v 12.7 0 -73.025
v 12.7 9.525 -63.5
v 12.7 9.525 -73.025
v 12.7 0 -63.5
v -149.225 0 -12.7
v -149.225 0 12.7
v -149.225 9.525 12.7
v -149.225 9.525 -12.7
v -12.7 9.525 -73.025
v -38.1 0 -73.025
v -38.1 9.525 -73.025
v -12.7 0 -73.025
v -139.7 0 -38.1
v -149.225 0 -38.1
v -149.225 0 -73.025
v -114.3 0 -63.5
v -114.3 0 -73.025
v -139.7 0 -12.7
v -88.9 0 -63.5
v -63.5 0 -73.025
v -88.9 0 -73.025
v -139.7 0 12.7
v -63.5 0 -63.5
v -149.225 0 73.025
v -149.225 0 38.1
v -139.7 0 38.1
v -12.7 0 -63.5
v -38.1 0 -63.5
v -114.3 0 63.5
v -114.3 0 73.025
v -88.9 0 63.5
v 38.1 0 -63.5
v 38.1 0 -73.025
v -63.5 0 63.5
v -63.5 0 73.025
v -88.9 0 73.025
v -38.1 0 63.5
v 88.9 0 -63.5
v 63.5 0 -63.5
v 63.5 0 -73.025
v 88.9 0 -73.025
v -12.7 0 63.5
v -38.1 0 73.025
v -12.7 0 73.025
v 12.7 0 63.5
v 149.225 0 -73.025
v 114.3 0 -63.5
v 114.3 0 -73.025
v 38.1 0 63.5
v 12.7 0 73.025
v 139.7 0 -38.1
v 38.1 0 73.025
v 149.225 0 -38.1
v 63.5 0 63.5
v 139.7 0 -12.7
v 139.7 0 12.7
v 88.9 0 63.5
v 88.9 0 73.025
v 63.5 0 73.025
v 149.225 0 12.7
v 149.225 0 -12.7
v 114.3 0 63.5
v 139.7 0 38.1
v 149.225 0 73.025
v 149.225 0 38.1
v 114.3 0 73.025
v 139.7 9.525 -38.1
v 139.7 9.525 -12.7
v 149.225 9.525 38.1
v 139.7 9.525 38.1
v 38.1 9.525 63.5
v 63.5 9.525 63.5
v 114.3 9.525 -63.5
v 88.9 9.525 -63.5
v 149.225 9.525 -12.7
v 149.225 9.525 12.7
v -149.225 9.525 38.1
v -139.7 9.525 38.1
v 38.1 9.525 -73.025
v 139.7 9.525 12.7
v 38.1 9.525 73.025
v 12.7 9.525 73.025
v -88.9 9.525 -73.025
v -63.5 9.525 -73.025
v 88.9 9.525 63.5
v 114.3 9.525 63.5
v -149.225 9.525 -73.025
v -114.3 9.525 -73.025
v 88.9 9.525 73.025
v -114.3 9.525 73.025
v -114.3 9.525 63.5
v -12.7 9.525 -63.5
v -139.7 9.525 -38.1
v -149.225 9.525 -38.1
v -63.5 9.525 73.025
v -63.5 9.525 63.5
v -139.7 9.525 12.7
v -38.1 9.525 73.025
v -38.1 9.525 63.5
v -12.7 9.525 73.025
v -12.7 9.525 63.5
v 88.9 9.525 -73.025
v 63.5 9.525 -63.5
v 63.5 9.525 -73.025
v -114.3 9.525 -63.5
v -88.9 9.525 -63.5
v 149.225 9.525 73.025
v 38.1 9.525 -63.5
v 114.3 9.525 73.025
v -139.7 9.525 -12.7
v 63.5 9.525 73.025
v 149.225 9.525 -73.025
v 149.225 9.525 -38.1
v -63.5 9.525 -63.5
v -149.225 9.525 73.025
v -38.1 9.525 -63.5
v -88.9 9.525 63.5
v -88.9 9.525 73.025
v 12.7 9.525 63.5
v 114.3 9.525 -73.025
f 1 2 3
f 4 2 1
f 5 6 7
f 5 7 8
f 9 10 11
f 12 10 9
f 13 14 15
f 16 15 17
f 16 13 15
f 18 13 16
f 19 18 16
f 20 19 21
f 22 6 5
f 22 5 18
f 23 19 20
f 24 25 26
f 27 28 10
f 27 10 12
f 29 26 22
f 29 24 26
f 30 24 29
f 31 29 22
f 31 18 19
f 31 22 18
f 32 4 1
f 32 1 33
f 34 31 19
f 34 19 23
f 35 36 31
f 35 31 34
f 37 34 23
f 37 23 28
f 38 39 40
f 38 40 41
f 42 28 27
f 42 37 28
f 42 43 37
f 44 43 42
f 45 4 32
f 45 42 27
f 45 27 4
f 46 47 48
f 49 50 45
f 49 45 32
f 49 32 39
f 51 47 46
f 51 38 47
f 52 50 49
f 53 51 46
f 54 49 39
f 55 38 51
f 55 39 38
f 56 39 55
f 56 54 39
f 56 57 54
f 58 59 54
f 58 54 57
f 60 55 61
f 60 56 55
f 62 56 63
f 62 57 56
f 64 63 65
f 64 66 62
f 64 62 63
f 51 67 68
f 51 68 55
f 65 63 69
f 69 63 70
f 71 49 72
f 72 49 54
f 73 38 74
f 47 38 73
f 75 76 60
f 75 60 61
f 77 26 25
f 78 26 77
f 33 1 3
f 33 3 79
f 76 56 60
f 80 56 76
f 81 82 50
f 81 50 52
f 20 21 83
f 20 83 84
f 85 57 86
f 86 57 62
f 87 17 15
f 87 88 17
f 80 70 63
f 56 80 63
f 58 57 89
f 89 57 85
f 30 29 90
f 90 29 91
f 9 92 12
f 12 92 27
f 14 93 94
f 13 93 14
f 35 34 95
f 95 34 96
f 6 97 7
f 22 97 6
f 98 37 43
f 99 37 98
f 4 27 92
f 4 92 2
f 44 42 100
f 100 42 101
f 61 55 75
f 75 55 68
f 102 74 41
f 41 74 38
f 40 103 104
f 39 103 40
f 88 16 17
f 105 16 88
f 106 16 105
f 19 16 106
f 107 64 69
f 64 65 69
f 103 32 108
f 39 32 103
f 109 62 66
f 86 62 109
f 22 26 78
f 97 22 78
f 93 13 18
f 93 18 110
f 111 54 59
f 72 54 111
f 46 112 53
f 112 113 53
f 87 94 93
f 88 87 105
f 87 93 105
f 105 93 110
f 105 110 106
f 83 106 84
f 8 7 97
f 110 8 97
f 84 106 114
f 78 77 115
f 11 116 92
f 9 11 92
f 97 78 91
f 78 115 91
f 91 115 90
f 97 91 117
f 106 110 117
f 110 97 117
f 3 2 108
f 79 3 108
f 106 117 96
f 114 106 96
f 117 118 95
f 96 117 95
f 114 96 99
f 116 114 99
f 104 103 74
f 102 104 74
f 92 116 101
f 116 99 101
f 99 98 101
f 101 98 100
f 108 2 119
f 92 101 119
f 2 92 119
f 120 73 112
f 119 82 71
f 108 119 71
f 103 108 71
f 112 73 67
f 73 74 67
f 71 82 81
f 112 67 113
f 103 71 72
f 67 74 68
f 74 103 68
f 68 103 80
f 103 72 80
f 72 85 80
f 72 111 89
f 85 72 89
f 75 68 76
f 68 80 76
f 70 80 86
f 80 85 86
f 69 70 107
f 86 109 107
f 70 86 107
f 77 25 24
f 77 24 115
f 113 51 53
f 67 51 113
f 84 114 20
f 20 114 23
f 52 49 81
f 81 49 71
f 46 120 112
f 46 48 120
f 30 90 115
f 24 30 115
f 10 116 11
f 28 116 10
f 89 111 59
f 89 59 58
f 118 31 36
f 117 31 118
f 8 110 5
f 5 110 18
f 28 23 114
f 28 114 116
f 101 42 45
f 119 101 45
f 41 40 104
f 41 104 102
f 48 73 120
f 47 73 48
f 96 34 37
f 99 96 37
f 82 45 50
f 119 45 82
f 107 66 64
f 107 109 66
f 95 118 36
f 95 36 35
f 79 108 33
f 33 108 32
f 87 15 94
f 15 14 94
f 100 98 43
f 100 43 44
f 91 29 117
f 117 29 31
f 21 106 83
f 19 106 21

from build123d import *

# Parameters (mm, degrees)
SKETCH2_W               = 279.4
SKETCH2_H               = 127
BOSS_EXTRUDE1_DEPTH     = 9.525
SKETCH3_W               = 25.4
SKETCH3_H               = 9.525
BOSS_EXTRUDE2_DEPTH     = 9.525
LPATTERN1_COUNT         = 6
LPATTERN1_PITCH         = 50.8
MIRROR1_COPY_1_SKETCH_W = 25.4
MIRROR1_COPY_1_SKETCH_H = 9.525
MIRROR1_COPY_1_DEPTH    = 9.525
MIRROR1_COPY_2_SKETCH_W = 25.4
MIRROR1_COPY_2_SKETCH_H = 9.525
MIRROR1_COPY_2_DEPTH    = 9.525
MIRROR1_COPY_3_SKETCH_W = 25.4
MIRROR1_COPY_3_SKETCH_H = 9.525
MIRROR1_COPY_3_DEPTH    = 9.525
MIRROR1_COPY_4_SKETCH_W = 25.4
MIRROR1_COPY_4_SKETCH_H = 9.525
MIRROR1_COPY_4_DEPTH    = 9.525
MIRROR1_COPY_5_SKETCH_W = 25.4
MIRROR1_COPY_5_SKETCH_H = 9.525
MIRROR1_COPY_5_DEPTH    = 9.525
SKETCH4_W               = 25.4
SKETCH4_H               = 9.525
BOSS_EXTRUDE3_DEPTH     = 9.525
LPATTERN2_COUNT         = 3
LPATTERN2_PITCH         = 50.8
MIRROR2_COPY_1_SKETCH_W = 25.4
MIRROR2_COPY_1_SKETCH_H = 9.525
MIRROR2_COPY_1_DEPTH    = 9.525
MIRROR2_COPY_2_SKETCH_W = 25.4
MIRROR2_COPY_2_SKETCH_H = 9.525
MIRROR2_COPY_2_DEPTH    = 9.525
SKETCH6_W               = 9.525
SKETCH6_H               = 9.525
BOSS_EXTRUDE4_DEPTH     = 9.525
MIRROR4_COPY_1_SKETCH_W = 9.525
MIRROR4_COPY_1_SKETCH_H = 9.525
MIRROR4_COPY_1_DEPTH    = 9.525
MIRROR4_COPY_2_SKETCH_W = 9.525
MIRROR4_COPY_2_SKETCH_H = 9.525
MIRROR4_COPY_2_DEPTH    = 9.525


with BuildPart() as part:
    # Sketch2 → Boss-Extrude1 (new body)
    with BuildSketch(Plane(origin=(0, 0, 0), x_dir=(1, 0, 0), z_dir=(0, 1, 0))):
        Rectangle(SKETCH2_W, SKETCH2_H)
    extrude(amount=BOSS_EXTRUDE1_DEPTH)

    # Sketch3 → Boss-Extrude2 (add)
    with BuildSketch(Plane.XY.offset(63.5)):
        with Locations((-127, 4.7625)):
            Rectangle(SKETCH3_W, SKETCH3_H)
    boss_extrude2 = extrude(amount=BOSS_EXTRUDE2_DEPTH)

    # LPattern1: Boss-Extrude2 ×6
    with Locations(*[(i * LPATTERN1_PITCH, 0, 0) for i in range(1, LPATTERN1_COUNT)]):
        add(boss_extrude2)

    # Mirror1: Boss-Extrude2 across plane
    add(boss_extrude2.mirror(Plane.XY))

    # Mirror1 copy 1 sketch → Mirror1 copy 1 (add)
    with BuildSketch(Plane(origin=(50.8, 0, -63.5), x_dir=(1, 0, 0), z_dir=(0, 0, -1))):
        with Locations((-127, -4.7625)):
            Rectangle(MIRROR1_COPY_1_SKETCH_W, MIRROR1_COPY_1_SKETCH_H)
    extrude(amount=MIRROR1_COPY_1_DEPTH)

    # Mirror1 copy 2 sketch → Mirror1 copy 2 (add)
    with BuildSketch(Plane(origin=(101.6, 0, -63.5), x_dir=(1, 0, 0), z_dir=(0, 0, -1))):
        with Locations((-127, -4.7625)):
            Rectangle(MIRROR1_COPY_2_SKETCH_W, MIRROR1_COPY_2_SKETCH_H)
    extrude(amount=MIRROR1_COPY_2_DEPTH)

    # Mirror1 copy 3 sketch → Mirror1 copy 3 (add)
    with BuildSketch(Plane(origin=(152.4, 0, -63.5), x_dir=(1, 0, 0), z_dir=(0, 0, -1))):
        with Locations((-127, -4.7625)):
            Rectangle(MIRROR1_COPY_3_SKETCH_W, MIRROR1_COPY_3_SKETCH_H)
    extrude(amount=MIRROR1_COPY_3_DEPTH)

    # Mirror1 copy 4 sketch → Mirror1 copy 4 (add)
    with BuildSketch(Plane(origin=(203.2, 0, -63.5), x_dir=(1, 0, 0), z_dir=(0, 0, -1))):
        with Locations((-127, -4.7625)):
            Rectangle(MIRROR1_COPY_4_SKETCH_W, MIRROR1_COPY_4_SKETCH_H)
    extrude(amount=MIRROR1_COPY_4_DEPTH)

    # Mirror1 copy 5 sketch → Mirror1 copy 5 (add)
    with BuildSketch(Plane(origin=(254, 0, -63.5), x_dir=(1, 0, 0), z_dir=(0, 0, -1))):
        with Locations((-127, -4.7625)):
            Rectangle(MIRROR1_COPY_5_SKETCH_W, MIRROR1_COPY_5_SKETCH_H)
    extrude(amount=MIRROR1_COPY_5_DEPTH)

    # Sketch4 → Boss-Extrude3 (add)
    with BuildSketch(Plane(origin=(139.7, 0, 0), x_dir=(0, 0, -1), z_dir=(1, 0, 0))):
        with Locations((-50.8, 4.7625)):
            Rectangle(SKETCH4_W, SKETCH4_H)
    boss_extrude3 = extrude(amount=BOSS_EXTRUDE3_DEPTH)

    # LPattern2: Boss-Extrude3 ×3
    with Locations(*[(0, 0, -i * LPATTERN2_PITCH) for i in range(1, LPATTERN2_COUNT)]):
        add(boss_extrude3)

    # Mirror2: Boss-Extrude3 across plane
    add(boss_extrude3.mirror(Plane(origin=(0, 0, 0), x_dir=(0, 0, 1), z_dir=(1, 0, 0))))

    # Mirror2 copy 1 sketch → Mirror2 copy 1 (add)
    with BuildSketch(Plane(origin=(-139.7, 0, -50.8), x_dir=(0, 0, -1), z_dir=(-1, 0, 0))):
        with Locations((-50.8, -4.7625)):
            Rectangle(MIRROR2_COPY_1_SKETCH_W, MIRROR2_COPY_1_SKETCH_H)
    extrude(amount=MIRROR2_COPY_1_DEPTH)

    # Mirror2 copy 2 sketch → Mirror2 copy 2 (add)
    with BuildSketch(Plane(origin=(-139.7, 0, -101.6), x_dir=(0, 0, -1), z_dir=(-1, 0, 0))):
        with Locations((-50.8, -4.7625)):
            Rectangle(MIRROR2_COPY_2_SKETCH_W, MIRROR2_COPY_2_SKETCH_H)
    extrude(amount=MIRROR2_COPY_2_DEPTH)

    # Sketch6 → Boss-Extrude4 (add)
    with BuildSketch(Plane.XY.offset(63.5)):
        with Locations((144.4625, 4.7625)):
            Rectangle(SKETCH6_W, SKETCH6_H)
    boss_extrude4 = extrude(amount=BOSS_EXTRUDE4_DEPTH)

    # Mirror3: Boss-Extrude4 across plane
    add(boss_extrude4.mirror(Plane(origin=(0, 0, 0), x_dir=(0, 0, 1), z_dir=(1, 0, 0))))

    # Mirror4 copy 1 sketch → Mirror4 copy 1 (add)
    with BuildSketch(Plane(origin=(0, 0, -63.5), x_dir=(-1, 0, 0), z_dir=(0, 0, -1))):
        with Locations((144.4625, 4.7625)):
            Rectangle(MIRROR4_COPY_1_SKETCH_W, MIRROR4_COPY_1_SKETCH_H)
    extrude(amount=MIRROR4_COPY_1_DEPTH)

    # Mirror4 copy 2 sketch → Mirror4 copy 2 (add)
    with BuildSketch(Plane(origin=(0, 0, -63.5), x_dir=(1, 0, 0), z_dir=(0, 0, -1))):
        with Locations((144.4625, -4.7625)):
            Rectangle(MIRROR4_COPY_2_SKETCH_W, MIRROR4_COPY_2_SKETCH_H)
    extrude(amount=MIRROR4_COPY_2_DEPTH)


solid = part.part
